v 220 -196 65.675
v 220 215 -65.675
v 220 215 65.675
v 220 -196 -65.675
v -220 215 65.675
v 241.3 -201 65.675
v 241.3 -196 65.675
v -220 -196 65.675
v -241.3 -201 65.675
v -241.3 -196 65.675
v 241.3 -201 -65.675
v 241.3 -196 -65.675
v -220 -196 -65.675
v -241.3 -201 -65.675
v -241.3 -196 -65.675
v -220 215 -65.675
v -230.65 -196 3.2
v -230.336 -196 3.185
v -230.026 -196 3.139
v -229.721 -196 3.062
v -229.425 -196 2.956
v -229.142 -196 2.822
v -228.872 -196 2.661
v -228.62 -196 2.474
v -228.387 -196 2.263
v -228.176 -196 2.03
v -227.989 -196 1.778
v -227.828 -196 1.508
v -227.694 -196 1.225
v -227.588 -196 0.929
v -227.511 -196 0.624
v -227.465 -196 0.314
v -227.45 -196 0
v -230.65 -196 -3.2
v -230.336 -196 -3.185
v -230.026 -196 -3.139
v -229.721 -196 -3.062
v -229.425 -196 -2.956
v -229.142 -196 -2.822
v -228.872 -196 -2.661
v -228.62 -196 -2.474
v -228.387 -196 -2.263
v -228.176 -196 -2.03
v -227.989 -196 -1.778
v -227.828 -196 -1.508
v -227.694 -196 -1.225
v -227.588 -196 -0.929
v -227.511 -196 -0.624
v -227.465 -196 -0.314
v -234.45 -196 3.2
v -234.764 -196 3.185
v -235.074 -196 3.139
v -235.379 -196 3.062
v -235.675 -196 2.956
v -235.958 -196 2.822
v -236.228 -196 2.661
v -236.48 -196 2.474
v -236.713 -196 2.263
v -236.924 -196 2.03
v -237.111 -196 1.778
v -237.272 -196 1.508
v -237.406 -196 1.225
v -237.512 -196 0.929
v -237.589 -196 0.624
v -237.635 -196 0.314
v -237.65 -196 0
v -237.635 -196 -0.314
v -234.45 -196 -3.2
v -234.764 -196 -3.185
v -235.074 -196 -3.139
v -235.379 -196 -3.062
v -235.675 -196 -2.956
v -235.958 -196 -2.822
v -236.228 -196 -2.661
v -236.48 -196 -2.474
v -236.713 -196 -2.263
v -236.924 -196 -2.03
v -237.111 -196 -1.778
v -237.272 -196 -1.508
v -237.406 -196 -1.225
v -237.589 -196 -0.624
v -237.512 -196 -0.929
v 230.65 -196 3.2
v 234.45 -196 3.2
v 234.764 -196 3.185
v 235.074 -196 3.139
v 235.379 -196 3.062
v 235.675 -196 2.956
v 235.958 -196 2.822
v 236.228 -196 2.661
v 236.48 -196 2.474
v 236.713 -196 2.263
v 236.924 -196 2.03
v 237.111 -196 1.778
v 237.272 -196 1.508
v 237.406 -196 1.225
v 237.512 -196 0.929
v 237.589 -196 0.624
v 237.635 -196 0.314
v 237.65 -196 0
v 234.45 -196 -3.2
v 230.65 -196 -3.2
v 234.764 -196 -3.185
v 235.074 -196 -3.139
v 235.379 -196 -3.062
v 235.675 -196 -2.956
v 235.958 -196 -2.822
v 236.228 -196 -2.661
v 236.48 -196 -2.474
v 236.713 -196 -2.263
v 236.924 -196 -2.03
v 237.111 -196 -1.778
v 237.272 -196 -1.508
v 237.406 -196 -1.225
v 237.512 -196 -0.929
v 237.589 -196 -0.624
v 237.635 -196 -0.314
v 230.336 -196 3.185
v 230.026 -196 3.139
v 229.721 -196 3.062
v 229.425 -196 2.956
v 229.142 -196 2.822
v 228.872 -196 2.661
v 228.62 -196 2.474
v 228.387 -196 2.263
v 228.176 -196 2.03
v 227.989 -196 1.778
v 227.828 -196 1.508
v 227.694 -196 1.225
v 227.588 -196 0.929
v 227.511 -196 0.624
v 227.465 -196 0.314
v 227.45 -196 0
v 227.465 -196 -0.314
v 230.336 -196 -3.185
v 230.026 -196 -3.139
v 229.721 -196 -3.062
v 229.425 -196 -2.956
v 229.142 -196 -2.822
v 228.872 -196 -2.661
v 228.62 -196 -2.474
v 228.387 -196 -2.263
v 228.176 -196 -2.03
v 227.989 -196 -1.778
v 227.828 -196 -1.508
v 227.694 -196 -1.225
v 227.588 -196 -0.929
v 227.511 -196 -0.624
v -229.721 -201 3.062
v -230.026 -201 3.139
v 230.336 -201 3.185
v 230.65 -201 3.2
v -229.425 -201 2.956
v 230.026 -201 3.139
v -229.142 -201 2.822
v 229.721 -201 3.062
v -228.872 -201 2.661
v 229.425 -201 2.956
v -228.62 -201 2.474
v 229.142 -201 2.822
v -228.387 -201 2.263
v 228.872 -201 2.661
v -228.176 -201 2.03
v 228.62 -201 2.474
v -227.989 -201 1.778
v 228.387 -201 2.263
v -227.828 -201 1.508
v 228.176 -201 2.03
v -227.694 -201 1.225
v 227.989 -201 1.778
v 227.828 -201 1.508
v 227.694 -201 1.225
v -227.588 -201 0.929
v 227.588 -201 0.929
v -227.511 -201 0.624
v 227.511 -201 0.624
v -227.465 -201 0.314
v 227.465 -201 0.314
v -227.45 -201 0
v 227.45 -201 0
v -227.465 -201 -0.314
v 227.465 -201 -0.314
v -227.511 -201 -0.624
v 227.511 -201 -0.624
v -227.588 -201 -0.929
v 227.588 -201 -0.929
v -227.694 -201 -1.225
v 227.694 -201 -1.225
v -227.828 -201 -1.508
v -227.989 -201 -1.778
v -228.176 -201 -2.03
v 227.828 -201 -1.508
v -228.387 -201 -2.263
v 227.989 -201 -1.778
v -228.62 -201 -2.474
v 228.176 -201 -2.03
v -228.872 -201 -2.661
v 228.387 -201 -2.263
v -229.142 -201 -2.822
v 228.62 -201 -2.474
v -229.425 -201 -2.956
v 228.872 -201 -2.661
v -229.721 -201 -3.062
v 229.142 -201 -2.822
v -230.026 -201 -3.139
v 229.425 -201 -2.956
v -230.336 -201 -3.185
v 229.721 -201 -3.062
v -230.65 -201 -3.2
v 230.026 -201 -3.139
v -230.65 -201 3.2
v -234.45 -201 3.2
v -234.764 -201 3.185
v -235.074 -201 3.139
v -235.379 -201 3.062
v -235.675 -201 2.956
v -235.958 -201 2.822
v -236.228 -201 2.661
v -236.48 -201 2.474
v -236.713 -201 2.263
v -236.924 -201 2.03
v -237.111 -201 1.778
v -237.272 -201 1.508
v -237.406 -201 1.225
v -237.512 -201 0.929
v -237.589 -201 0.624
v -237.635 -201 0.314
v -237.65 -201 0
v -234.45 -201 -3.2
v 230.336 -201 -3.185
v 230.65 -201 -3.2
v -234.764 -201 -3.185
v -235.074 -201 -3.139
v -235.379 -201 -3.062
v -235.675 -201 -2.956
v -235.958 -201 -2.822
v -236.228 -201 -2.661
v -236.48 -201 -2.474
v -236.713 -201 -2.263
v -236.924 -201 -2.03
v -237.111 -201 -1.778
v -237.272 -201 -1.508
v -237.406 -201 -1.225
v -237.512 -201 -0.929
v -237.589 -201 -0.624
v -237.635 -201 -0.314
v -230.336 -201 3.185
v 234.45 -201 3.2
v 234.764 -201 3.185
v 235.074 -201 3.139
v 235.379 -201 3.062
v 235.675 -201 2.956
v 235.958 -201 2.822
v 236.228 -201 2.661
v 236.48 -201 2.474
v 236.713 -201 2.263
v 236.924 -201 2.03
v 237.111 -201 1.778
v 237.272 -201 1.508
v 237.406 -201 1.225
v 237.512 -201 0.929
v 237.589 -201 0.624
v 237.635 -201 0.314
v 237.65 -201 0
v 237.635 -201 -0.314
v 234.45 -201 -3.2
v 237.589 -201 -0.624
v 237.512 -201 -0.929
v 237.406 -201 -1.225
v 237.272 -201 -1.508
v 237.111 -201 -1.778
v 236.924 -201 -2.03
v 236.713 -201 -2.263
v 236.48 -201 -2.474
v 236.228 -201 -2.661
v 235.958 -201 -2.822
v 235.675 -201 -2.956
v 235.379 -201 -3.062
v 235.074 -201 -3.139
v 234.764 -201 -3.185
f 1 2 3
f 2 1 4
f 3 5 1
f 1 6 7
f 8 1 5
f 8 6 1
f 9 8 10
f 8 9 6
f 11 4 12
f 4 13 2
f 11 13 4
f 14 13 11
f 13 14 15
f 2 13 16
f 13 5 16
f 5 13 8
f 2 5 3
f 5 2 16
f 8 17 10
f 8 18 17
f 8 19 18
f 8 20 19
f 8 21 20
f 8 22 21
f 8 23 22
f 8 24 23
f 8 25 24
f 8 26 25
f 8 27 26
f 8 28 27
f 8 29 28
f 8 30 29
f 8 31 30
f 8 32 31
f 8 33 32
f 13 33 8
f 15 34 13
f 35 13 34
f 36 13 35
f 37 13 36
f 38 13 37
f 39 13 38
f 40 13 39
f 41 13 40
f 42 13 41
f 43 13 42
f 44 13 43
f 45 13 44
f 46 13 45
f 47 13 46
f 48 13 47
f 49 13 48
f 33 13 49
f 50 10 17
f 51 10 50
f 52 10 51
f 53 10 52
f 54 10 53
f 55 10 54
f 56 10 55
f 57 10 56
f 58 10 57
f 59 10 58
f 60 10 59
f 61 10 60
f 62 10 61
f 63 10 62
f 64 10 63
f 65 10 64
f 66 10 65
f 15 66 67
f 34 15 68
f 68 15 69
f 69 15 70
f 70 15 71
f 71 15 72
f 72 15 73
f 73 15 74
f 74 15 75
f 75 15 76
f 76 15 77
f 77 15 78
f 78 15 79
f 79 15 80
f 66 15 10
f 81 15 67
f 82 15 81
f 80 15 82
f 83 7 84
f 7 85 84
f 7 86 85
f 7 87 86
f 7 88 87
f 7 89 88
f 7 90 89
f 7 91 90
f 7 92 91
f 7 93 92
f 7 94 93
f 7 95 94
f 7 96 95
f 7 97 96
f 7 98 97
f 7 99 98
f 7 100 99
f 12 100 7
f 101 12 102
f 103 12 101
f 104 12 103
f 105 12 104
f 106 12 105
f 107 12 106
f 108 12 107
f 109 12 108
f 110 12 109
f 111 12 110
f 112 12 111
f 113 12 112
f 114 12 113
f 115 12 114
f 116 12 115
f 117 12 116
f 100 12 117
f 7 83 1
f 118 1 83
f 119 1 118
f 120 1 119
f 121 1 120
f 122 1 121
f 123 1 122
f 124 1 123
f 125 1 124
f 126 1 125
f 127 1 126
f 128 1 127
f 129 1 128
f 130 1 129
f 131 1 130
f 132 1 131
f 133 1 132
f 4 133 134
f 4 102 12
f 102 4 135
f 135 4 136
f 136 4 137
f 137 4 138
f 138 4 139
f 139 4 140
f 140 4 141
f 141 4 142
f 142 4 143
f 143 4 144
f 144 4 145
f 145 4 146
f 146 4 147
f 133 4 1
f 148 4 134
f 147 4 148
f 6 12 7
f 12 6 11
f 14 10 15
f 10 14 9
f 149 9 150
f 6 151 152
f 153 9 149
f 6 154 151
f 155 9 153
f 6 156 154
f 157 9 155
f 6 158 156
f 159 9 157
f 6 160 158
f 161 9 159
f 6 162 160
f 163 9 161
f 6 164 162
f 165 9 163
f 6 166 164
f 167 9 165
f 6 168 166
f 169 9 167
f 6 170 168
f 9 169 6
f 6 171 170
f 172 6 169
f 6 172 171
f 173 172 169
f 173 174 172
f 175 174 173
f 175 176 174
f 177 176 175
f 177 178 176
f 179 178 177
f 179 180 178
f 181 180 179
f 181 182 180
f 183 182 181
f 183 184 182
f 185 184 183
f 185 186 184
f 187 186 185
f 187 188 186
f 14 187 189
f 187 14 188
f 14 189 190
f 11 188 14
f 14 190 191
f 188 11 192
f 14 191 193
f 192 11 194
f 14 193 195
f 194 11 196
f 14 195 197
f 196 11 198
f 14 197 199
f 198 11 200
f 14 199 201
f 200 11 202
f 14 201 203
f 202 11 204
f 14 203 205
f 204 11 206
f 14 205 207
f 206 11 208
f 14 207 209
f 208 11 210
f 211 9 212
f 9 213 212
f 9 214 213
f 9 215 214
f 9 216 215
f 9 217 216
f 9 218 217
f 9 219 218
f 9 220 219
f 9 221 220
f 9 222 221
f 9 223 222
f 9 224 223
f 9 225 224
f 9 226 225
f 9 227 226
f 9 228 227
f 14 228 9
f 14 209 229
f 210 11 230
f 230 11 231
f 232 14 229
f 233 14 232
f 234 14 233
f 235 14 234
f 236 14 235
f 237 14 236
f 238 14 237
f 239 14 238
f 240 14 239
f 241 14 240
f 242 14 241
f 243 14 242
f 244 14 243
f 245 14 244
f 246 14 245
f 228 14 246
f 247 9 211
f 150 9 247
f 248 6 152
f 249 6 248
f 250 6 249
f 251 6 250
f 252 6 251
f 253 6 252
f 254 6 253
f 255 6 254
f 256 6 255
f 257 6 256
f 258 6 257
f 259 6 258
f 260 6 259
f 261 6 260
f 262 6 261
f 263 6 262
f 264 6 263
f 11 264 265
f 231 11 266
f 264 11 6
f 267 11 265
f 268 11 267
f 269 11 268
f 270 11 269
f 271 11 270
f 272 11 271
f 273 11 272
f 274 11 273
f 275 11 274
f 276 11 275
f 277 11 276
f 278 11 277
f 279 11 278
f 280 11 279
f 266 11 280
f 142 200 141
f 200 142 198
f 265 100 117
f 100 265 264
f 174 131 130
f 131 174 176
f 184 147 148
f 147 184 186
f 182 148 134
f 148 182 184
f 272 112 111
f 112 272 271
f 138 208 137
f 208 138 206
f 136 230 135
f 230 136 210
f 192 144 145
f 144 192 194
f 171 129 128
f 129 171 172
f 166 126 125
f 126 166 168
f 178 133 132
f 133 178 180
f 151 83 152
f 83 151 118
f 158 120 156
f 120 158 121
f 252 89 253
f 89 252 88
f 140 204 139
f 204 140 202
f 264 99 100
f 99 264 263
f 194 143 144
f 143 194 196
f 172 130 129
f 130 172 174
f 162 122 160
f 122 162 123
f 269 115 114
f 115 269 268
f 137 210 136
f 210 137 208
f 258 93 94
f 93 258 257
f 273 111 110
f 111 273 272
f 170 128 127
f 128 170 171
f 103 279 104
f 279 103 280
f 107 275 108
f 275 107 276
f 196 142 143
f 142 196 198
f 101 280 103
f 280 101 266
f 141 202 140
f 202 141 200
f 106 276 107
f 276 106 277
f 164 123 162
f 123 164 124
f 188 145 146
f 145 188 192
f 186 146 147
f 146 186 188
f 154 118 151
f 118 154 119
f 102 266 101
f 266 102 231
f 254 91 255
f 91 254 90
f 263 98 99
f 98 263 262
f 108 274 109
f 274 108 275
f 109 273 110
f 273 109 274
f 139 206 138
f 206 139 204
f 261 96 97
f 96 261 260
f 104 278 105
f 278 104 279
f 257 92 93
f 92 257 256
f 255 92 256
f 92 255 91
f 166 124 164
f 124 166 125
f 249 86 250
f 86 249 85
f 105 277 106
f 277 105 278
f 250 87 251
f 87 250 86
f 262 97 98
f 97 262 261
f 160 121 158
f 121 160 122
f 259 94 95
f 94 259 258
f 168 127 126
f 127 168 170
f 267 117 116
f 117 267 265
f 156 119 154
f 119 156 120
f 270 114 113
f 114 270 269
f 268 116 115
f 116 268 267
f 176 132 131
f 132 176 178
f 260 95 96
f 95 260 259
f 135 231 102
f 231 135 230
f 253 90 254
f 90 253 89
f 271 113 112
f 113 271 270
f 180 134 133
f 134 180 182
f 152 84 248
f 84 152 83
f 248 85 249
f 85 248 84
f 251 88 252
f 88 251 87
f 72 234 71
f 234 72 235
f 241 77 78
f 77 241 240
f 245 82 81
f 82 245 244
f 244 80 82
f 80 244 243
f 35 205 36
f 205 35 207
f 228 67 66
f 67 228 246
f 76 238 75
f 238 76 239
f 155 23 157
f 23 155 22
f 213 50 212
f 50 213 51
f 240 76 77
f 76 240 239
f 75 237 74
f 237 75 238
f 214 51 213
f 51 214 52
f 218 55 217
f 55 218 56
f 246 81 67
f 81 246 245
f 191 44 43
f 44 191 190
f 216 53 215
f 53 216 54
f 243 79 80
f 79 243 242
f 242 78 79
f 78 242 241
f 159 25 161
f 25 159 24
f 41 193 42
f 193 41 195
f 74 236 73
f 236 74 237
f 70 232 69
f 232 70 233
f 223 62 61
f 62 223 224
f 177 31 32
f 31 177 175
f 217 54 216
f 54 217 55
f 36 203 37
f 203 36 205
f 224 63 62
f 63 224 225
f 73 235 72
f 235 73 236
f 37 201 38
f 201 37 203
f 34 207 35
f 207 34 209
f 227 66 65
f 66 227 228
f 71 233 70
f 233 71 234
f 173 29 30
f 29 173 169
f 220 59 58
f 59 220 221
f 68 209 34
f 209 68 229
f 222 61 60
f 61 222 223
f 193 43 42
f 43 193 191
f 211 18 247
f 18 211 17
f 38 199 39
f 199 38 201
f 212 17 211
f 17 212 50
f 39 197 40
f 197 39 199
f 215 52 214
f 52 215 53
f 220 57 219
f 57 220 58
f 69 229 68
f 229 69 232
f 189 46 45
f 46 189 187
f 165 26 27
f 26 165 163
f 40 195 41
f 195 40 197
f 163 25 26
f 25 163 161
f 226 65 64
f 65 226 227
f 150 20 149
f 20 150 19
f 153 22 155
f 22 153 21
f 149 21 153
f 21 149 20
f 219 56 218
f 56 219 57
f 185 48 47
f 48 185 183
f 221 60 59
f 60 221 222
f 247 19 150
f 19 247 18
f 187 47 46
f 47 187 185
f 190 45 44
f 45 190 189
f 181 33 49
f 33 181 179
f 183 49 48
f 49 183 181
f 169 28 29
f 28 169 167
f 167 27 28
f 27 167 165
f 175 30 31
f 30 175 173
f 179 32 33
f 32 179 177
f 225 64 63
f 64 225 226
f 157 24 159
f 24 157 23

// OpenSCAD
// ============================================================================
// Atom Lithography Machine — Parametric OpenSCAD Module (S1.1-05)
// ============================================================================
// part_id           : S1.1-05
// parent_bom_id     : S1.1
// subsystem         : S1
// part_name         : Izole yuksek gerilim ark/katot guc platformu (15 kV deck)
// material          : Al 6061
// temp_stage        : 300 K (kabin)
// vacuum_grade      : Atmosfer
// tolerance         : ±10 ppm/saat
// computed_mass_kg  : 11.20687
// envelope_mm       : 482.600 x 442.500 x 131.350
// design_maturity   : M0_M1_DETAILED_CAD_DESIGN_ONLY
// no_lab_measurement: true
// iec61508_certified: false
// semi_s2_certified : false
// Units: millimeters (mm)
// ============================================================================

$fn = 64;

// Nominal bounding envelope parameters (mm)
bbox_x = 482.6000;
bbox_y = 442.5000;
bbox_z = 131.3500;

// Part-specific parametric dimensions
rack_u = 3;
u_slots = "U27-U29";
v_max_kV = 15.0;
sf6_free = "true";

// Interface / port parameters (mm)
port_hv_15kv_out_od = 14.000;
port_fiber_ctrl_od = 10.000;

module part_S1_1_05() {
  difference() {
    union() {
      // 3U hollow 19-in chassis body (width along X)
      translate([0.000, 9.500, 0.000]) cube([440.000, 411.000, 131.350], center=true);
      // EIA-310 19-in front panel w/ mounting ears facing -Y
      translate([0.000, -198.500, 0.000]) cube([482.600, 5.000, 131.350], center=true);
    }
    // EIA-310 +X rack slot
    translate([232.550, -198.500, 0.000]) rotate([90.000, 0.000, 0.000]) {
      hull() {
        translate([-1.900, 0, 0]) cylinder(d=6.400, h=9.000, center=true);
        translate([1.900, 0, 0]) cylinder(d=6.400, h=9.000, center=true);
      }
    }
    // EIA-310 -X rack slot
    translate([-232.550, -198.500, 0.000]) rotate([90.000, 0.000, 0.000]) {
      hull() {
        translate([-1.900, 0, 0]) cylinder(d=6.400, h=9.000, center=true);
        translate([1.900, 0, 0]) cylinder(d=6.400, h=9.000, center=true);
      }
    }
  }
}

// World assembly mounting transform (global machine frame, mm / deg):
// translate([1480.000, -223.000, 812.375]) rotate([0.000, 0.000, 0.000]) part_S1_1_05();

part_S1_1_05();
